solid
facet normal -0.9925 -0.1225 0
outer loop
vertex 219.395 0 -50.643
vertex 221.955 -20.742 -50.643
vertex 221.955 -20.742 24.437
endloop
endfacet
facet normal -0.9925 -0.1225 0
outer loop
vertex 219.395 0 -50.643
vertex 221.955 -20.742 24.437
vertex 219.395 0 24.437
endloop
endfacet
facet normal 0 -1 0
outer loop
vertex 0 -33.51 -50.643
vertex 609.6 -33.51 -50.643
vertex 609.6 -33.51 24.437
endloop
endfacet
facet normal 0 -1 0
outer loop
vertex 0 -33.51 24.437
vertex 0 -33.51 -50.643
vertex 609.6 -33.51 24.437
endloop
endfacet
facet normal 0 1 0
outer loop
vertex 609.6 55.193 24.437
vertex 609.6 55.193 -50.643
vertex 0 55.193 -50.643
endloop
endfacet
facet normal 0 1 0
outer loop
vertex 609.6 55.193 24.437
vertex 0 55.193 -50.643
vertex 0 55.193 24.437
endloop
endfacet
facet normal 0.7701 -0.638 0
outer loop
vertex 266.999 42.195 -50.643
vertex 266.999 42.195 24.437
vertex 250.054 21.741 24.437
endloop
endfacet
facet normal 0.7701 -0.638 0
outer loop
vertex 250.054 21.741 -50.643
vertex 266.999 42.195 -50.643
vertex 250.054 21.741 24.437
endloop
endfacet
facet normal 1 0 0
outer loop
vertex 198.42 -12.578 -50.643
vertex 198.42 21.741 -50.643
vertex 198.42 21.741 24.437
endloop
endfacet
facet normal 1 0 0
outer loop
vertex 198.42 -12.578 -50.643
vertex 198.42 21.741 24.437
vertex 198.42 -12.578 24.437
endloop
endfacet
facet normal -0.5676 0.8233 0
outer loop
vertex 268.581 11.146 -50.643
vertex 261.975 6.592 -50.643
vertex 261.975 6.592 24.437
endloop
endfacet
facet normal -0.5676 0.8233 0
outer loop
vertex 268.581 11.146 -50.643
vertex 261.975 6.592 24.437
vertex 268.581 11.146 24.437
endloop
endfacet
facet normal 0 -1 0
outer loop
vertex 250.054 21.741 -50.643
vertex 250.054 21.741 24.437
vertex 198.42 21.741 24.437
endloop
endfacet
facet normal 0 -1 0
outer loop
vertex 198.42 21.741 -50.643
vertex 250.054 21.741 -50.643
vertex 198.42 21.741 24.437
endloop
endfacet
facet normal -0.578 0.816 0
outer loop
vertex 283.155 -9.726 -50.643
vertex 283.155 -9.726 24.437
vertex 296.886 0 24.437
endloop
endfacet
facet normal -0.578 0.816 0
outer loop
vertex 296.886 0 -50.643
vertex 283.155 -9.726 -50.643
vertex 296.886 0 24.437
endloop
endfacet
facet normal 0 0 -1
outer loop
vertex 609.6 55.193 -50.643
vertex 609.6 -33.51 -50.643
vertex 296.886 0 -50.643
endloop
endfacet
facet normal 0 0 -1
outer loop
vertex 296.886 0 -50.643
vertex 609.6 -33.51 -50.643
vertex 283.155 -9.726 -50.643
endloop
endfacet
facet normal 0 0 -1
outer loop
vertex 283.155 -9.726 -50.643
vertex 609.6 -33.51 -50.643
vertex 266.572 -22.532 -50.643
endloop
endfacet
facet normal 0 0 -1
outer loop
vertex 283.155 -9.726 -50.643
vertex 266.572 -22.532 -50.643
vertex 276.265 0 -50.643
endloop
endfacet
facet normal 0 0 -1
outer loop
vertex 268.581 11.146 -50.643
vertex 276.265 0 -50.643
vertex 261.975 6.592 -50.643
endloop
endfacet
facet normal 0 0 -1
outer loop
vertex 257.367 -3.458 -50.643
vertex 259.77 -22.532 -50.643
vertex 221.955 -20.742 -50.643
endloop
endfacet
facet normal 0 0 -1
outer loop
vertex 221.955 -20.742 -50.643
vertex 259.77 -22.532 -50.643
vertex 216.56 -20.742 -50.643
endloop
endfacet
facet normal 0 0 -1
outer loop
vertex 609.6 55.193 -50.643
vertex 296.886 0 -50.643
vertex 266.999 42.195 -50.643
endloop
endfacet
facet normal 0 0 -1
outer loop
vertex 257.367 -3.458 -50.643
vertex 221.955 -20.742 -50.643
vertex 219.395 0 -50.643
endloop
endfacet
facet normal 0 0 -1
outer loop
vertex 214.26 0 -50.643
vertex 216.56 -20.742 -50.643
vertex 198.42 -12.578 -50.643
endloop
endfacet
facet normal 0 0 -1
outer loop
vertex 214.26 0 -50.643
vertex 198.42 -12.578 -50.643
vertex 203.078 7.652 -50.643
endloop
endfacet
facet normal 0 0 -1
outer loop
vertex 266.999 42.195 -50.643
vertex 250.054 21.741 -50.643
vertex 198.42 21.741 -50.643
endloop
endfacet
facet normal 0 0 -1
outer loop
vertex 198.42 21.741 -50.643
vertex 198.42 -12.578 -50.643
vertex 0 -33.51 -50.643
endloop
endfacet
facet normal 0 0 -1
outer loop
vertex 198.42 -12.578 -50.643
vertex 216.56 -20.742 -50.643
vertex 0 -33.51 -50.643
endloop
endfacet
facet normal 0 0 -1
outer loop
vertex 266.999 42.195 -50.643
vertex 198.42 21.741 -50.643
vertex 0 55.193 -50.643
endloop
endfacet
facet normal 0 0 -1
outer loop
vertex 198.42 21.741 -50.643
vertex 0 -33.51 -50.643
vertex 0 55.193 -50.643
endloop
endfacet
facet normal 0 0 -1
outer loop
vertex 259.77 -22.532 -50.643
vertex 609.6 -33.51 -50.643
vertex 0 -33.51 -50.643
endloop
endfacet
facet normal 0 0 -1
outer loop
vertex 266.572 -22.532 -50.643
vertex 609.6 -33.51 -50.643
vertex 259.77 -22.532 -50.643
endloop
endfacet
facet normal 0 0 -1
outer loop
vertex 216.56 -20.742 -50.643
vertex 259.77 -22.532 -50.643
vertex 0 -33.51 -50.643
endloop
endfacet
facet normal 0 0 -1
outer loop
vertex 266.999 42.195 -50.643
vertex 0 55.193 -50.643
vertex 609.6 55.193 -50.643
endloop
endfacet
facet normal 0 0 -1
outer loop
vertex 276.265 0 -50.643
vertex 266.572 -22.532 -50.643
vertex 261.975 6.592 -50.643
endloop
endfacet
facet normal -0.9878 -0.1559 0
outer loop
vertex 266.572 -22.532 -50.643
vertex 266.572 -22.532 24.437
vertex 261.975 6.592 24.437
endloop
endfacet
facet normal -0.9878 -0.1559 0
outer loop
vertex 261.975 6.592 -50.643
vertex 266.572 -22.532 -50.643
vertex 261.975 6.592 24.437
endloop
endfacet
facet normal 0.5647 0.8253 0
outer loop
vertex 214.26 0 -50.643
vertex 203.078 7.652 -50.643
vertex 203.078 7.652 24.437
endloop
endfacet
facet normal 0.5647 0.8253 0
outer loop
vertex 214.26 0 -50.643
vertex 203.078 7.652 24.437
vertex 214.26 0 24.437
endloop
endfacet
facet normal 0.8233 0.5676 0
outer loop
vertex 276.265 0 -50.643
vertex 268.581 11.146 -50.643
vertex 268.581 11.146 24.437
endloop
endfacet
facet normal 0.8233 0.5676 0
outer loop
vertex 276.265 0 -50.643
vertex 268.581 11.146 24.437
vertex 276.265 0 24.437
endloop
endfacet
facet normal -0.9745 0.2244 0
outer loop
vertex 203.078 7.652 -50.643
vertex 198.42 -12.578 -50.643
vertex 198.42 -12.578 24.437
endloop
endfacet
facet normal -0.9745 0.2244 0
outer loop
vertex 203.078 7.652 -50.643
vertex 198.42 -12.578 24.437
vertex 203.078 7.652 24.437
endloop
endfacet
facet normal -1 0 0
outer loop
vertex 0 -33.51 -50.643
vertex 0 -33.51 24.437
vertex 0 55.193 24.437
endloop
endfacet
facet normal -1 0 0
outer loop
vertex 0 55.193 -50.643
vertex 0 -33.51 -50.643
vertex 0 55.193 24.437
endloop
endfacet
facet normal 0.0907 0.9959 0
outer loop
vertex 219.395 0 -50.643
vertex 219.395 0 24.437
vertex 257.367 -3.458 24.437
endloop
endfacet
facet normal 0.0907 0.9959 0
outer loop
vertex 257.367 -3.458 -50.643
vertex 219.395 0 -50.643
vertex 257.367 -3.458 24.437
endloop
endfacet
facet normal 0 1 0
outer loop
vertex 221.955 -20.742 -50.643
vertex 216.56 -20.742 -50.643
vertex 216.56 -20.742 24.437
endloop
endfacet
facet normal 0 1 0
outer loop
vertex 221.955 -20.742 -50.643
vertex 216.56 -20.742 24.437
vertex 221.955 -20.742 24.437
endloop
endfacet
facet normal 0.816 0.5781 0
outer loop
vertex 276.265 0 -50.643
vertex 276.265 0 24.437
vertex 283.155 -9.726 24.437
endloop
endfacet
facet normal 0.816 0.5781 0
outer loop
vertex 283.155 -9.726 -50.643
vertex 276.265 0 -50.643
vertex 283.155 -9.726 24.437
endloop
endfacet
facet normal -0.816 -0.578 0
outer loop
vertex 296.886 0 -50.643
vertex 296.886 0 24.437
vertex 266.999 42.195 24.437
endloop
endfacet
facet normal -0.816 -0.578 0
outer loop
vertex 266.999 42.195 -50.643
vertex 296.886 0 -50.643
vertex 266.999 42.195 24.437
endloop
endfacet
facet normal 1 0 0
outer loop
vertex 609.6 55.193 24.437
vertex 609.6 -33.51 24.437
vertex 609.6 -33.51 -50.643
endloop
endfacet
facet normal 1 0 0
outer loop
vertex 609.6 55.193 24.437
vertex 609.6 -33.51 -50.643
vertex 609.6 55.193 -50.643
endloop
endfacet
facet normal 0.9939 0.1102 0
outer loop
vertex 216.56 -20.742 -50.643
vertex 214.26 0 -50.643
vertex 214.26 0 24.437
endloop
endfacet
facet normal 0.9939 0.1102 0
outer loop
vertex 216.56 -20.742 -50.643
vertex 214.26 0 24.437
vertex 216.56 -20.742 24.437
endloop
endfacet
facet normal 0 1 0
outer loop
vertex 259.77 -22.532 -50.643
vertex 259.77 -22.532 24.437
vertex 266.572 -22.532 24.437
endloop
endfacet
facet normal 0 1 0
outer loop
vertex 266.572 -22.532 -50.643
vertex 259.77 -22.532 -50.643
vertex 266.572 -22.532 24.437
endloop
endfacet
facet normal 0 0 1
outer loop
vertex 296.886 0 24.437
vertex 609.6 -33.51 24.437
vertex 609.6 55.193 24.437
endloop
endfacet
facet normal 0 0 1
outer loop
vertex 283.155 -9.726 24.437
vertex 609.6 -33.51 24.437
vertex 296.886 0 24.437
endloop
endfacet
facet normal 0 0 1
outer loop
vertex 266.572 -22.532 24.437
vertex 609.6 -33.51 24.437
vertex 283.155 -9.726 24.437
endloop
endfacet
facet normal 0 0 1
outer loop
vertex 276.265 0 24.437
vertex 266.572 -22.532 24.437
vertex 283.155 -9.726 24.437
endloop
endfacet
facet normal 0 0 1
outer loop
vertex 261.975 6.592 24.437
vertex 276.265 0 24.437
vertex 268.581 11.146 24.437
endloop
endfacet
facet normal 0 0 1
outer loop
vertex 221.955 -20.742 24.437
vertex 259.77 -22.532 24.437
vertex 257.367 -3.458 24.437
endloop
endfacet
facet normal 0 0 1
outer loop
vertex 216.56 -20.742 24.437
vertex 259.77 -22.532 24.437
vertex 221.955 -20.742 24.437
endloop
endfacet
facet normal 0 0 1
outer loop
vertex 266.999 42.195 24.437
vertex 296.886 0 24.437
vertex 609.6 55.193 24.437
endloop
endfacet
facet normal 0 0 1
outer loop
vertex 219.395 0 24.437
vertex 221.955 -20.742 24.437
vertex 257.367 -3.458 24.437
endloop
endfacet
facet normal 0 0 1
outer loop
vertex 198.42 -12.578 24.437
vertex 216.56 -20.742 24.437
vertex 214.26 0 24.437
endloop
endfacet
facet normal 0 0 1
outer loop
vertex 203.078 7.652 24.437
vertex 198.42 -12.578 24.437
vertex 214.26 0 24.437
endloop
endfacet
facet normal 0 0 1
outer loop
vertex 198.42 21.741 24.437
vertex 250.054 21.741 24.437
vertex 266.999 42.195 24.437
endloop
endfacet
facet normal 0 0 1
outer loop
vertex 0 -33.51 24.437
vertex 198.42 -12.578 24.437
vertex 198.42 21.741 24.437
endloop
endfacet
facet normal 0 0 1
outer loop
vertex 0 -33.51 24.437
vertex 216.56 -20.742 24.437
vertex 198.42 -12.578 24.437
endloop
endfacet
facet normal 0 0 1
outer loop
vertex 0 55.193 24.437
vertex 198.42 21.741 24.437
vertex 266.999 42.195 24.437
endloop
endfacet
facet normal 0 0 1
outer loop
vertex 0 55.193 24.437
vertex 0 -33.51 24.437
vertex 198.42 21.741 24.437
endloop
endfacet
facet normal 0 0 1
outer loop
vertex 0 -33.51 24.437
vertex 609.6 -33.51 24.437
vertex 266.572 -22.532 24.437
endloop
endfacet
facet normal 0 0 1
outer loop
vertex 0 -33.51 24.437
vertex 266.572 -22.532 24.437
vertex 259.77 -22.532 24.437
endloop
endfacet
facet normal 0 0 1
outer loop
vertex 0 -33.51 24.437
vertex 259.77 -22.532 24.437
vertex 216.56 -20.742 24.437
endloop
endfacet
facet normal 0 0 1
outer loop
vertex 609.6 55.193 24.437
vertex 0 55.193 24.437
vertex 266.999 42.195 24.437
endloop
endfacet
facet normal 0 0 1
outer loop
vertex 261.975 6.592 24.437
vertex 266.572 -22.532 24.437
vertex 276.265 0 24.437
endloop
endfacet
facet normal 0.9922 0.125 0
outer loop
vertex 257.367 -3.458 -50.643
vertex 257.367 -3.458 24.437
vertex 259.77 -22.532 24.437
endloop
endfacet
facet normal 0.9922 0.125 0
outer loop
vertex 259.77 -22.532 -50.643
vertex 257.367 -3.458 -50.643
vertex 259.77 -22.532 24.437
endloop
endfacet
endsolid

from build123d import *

# Parameters (mm, degrees)
F0_W     = 88.7035392225
F0_H     = 75.0795733184
F1_DEPTH = 609.6
F3_DEPTH = 75.0805733184


with BuildPart() as f1:
    # F0 (on Right) → F1 (new body)
    with BuildSketch(Plane.YZ):
        with Locations((10.8415391296, -13.1027223542)):
            Rectangle(F0_W, F0_H)
    extrude(amount=F1_DEPTH)

    # F2 (on face) → F3 (cut, through all)
    with BuildSketch(Plane.XY.offset(24.4370643049)):
        Polygon((250.0542104244, 21.7413976789), (198.4199732542, 21.7413976789), (198.4199732542, -12.5776519999), (203.0778974295, 7.6524470933), (214.2598032951, 0), (216.5598422289, -20.7415837795), (221.9552248716, -20.7415837795), (219.3950414658, 0), (257.3667168617, -3.4582386725), (259.7696781158, -22.5320160389), (266.5723860264, -22.5320160389), (261.9751274163, 6.5919420698), (268.5813307762, 11.1460844055), (276.2651473502, 0), (283.1545623022, -9.7264384601), (296.8862950802, 0), (266.9985592365, 42.1953424811), align=None)
    extrude(amount=-F3_DEPTH, mode=Mode.SUBTRACT)


solid = f1.part
